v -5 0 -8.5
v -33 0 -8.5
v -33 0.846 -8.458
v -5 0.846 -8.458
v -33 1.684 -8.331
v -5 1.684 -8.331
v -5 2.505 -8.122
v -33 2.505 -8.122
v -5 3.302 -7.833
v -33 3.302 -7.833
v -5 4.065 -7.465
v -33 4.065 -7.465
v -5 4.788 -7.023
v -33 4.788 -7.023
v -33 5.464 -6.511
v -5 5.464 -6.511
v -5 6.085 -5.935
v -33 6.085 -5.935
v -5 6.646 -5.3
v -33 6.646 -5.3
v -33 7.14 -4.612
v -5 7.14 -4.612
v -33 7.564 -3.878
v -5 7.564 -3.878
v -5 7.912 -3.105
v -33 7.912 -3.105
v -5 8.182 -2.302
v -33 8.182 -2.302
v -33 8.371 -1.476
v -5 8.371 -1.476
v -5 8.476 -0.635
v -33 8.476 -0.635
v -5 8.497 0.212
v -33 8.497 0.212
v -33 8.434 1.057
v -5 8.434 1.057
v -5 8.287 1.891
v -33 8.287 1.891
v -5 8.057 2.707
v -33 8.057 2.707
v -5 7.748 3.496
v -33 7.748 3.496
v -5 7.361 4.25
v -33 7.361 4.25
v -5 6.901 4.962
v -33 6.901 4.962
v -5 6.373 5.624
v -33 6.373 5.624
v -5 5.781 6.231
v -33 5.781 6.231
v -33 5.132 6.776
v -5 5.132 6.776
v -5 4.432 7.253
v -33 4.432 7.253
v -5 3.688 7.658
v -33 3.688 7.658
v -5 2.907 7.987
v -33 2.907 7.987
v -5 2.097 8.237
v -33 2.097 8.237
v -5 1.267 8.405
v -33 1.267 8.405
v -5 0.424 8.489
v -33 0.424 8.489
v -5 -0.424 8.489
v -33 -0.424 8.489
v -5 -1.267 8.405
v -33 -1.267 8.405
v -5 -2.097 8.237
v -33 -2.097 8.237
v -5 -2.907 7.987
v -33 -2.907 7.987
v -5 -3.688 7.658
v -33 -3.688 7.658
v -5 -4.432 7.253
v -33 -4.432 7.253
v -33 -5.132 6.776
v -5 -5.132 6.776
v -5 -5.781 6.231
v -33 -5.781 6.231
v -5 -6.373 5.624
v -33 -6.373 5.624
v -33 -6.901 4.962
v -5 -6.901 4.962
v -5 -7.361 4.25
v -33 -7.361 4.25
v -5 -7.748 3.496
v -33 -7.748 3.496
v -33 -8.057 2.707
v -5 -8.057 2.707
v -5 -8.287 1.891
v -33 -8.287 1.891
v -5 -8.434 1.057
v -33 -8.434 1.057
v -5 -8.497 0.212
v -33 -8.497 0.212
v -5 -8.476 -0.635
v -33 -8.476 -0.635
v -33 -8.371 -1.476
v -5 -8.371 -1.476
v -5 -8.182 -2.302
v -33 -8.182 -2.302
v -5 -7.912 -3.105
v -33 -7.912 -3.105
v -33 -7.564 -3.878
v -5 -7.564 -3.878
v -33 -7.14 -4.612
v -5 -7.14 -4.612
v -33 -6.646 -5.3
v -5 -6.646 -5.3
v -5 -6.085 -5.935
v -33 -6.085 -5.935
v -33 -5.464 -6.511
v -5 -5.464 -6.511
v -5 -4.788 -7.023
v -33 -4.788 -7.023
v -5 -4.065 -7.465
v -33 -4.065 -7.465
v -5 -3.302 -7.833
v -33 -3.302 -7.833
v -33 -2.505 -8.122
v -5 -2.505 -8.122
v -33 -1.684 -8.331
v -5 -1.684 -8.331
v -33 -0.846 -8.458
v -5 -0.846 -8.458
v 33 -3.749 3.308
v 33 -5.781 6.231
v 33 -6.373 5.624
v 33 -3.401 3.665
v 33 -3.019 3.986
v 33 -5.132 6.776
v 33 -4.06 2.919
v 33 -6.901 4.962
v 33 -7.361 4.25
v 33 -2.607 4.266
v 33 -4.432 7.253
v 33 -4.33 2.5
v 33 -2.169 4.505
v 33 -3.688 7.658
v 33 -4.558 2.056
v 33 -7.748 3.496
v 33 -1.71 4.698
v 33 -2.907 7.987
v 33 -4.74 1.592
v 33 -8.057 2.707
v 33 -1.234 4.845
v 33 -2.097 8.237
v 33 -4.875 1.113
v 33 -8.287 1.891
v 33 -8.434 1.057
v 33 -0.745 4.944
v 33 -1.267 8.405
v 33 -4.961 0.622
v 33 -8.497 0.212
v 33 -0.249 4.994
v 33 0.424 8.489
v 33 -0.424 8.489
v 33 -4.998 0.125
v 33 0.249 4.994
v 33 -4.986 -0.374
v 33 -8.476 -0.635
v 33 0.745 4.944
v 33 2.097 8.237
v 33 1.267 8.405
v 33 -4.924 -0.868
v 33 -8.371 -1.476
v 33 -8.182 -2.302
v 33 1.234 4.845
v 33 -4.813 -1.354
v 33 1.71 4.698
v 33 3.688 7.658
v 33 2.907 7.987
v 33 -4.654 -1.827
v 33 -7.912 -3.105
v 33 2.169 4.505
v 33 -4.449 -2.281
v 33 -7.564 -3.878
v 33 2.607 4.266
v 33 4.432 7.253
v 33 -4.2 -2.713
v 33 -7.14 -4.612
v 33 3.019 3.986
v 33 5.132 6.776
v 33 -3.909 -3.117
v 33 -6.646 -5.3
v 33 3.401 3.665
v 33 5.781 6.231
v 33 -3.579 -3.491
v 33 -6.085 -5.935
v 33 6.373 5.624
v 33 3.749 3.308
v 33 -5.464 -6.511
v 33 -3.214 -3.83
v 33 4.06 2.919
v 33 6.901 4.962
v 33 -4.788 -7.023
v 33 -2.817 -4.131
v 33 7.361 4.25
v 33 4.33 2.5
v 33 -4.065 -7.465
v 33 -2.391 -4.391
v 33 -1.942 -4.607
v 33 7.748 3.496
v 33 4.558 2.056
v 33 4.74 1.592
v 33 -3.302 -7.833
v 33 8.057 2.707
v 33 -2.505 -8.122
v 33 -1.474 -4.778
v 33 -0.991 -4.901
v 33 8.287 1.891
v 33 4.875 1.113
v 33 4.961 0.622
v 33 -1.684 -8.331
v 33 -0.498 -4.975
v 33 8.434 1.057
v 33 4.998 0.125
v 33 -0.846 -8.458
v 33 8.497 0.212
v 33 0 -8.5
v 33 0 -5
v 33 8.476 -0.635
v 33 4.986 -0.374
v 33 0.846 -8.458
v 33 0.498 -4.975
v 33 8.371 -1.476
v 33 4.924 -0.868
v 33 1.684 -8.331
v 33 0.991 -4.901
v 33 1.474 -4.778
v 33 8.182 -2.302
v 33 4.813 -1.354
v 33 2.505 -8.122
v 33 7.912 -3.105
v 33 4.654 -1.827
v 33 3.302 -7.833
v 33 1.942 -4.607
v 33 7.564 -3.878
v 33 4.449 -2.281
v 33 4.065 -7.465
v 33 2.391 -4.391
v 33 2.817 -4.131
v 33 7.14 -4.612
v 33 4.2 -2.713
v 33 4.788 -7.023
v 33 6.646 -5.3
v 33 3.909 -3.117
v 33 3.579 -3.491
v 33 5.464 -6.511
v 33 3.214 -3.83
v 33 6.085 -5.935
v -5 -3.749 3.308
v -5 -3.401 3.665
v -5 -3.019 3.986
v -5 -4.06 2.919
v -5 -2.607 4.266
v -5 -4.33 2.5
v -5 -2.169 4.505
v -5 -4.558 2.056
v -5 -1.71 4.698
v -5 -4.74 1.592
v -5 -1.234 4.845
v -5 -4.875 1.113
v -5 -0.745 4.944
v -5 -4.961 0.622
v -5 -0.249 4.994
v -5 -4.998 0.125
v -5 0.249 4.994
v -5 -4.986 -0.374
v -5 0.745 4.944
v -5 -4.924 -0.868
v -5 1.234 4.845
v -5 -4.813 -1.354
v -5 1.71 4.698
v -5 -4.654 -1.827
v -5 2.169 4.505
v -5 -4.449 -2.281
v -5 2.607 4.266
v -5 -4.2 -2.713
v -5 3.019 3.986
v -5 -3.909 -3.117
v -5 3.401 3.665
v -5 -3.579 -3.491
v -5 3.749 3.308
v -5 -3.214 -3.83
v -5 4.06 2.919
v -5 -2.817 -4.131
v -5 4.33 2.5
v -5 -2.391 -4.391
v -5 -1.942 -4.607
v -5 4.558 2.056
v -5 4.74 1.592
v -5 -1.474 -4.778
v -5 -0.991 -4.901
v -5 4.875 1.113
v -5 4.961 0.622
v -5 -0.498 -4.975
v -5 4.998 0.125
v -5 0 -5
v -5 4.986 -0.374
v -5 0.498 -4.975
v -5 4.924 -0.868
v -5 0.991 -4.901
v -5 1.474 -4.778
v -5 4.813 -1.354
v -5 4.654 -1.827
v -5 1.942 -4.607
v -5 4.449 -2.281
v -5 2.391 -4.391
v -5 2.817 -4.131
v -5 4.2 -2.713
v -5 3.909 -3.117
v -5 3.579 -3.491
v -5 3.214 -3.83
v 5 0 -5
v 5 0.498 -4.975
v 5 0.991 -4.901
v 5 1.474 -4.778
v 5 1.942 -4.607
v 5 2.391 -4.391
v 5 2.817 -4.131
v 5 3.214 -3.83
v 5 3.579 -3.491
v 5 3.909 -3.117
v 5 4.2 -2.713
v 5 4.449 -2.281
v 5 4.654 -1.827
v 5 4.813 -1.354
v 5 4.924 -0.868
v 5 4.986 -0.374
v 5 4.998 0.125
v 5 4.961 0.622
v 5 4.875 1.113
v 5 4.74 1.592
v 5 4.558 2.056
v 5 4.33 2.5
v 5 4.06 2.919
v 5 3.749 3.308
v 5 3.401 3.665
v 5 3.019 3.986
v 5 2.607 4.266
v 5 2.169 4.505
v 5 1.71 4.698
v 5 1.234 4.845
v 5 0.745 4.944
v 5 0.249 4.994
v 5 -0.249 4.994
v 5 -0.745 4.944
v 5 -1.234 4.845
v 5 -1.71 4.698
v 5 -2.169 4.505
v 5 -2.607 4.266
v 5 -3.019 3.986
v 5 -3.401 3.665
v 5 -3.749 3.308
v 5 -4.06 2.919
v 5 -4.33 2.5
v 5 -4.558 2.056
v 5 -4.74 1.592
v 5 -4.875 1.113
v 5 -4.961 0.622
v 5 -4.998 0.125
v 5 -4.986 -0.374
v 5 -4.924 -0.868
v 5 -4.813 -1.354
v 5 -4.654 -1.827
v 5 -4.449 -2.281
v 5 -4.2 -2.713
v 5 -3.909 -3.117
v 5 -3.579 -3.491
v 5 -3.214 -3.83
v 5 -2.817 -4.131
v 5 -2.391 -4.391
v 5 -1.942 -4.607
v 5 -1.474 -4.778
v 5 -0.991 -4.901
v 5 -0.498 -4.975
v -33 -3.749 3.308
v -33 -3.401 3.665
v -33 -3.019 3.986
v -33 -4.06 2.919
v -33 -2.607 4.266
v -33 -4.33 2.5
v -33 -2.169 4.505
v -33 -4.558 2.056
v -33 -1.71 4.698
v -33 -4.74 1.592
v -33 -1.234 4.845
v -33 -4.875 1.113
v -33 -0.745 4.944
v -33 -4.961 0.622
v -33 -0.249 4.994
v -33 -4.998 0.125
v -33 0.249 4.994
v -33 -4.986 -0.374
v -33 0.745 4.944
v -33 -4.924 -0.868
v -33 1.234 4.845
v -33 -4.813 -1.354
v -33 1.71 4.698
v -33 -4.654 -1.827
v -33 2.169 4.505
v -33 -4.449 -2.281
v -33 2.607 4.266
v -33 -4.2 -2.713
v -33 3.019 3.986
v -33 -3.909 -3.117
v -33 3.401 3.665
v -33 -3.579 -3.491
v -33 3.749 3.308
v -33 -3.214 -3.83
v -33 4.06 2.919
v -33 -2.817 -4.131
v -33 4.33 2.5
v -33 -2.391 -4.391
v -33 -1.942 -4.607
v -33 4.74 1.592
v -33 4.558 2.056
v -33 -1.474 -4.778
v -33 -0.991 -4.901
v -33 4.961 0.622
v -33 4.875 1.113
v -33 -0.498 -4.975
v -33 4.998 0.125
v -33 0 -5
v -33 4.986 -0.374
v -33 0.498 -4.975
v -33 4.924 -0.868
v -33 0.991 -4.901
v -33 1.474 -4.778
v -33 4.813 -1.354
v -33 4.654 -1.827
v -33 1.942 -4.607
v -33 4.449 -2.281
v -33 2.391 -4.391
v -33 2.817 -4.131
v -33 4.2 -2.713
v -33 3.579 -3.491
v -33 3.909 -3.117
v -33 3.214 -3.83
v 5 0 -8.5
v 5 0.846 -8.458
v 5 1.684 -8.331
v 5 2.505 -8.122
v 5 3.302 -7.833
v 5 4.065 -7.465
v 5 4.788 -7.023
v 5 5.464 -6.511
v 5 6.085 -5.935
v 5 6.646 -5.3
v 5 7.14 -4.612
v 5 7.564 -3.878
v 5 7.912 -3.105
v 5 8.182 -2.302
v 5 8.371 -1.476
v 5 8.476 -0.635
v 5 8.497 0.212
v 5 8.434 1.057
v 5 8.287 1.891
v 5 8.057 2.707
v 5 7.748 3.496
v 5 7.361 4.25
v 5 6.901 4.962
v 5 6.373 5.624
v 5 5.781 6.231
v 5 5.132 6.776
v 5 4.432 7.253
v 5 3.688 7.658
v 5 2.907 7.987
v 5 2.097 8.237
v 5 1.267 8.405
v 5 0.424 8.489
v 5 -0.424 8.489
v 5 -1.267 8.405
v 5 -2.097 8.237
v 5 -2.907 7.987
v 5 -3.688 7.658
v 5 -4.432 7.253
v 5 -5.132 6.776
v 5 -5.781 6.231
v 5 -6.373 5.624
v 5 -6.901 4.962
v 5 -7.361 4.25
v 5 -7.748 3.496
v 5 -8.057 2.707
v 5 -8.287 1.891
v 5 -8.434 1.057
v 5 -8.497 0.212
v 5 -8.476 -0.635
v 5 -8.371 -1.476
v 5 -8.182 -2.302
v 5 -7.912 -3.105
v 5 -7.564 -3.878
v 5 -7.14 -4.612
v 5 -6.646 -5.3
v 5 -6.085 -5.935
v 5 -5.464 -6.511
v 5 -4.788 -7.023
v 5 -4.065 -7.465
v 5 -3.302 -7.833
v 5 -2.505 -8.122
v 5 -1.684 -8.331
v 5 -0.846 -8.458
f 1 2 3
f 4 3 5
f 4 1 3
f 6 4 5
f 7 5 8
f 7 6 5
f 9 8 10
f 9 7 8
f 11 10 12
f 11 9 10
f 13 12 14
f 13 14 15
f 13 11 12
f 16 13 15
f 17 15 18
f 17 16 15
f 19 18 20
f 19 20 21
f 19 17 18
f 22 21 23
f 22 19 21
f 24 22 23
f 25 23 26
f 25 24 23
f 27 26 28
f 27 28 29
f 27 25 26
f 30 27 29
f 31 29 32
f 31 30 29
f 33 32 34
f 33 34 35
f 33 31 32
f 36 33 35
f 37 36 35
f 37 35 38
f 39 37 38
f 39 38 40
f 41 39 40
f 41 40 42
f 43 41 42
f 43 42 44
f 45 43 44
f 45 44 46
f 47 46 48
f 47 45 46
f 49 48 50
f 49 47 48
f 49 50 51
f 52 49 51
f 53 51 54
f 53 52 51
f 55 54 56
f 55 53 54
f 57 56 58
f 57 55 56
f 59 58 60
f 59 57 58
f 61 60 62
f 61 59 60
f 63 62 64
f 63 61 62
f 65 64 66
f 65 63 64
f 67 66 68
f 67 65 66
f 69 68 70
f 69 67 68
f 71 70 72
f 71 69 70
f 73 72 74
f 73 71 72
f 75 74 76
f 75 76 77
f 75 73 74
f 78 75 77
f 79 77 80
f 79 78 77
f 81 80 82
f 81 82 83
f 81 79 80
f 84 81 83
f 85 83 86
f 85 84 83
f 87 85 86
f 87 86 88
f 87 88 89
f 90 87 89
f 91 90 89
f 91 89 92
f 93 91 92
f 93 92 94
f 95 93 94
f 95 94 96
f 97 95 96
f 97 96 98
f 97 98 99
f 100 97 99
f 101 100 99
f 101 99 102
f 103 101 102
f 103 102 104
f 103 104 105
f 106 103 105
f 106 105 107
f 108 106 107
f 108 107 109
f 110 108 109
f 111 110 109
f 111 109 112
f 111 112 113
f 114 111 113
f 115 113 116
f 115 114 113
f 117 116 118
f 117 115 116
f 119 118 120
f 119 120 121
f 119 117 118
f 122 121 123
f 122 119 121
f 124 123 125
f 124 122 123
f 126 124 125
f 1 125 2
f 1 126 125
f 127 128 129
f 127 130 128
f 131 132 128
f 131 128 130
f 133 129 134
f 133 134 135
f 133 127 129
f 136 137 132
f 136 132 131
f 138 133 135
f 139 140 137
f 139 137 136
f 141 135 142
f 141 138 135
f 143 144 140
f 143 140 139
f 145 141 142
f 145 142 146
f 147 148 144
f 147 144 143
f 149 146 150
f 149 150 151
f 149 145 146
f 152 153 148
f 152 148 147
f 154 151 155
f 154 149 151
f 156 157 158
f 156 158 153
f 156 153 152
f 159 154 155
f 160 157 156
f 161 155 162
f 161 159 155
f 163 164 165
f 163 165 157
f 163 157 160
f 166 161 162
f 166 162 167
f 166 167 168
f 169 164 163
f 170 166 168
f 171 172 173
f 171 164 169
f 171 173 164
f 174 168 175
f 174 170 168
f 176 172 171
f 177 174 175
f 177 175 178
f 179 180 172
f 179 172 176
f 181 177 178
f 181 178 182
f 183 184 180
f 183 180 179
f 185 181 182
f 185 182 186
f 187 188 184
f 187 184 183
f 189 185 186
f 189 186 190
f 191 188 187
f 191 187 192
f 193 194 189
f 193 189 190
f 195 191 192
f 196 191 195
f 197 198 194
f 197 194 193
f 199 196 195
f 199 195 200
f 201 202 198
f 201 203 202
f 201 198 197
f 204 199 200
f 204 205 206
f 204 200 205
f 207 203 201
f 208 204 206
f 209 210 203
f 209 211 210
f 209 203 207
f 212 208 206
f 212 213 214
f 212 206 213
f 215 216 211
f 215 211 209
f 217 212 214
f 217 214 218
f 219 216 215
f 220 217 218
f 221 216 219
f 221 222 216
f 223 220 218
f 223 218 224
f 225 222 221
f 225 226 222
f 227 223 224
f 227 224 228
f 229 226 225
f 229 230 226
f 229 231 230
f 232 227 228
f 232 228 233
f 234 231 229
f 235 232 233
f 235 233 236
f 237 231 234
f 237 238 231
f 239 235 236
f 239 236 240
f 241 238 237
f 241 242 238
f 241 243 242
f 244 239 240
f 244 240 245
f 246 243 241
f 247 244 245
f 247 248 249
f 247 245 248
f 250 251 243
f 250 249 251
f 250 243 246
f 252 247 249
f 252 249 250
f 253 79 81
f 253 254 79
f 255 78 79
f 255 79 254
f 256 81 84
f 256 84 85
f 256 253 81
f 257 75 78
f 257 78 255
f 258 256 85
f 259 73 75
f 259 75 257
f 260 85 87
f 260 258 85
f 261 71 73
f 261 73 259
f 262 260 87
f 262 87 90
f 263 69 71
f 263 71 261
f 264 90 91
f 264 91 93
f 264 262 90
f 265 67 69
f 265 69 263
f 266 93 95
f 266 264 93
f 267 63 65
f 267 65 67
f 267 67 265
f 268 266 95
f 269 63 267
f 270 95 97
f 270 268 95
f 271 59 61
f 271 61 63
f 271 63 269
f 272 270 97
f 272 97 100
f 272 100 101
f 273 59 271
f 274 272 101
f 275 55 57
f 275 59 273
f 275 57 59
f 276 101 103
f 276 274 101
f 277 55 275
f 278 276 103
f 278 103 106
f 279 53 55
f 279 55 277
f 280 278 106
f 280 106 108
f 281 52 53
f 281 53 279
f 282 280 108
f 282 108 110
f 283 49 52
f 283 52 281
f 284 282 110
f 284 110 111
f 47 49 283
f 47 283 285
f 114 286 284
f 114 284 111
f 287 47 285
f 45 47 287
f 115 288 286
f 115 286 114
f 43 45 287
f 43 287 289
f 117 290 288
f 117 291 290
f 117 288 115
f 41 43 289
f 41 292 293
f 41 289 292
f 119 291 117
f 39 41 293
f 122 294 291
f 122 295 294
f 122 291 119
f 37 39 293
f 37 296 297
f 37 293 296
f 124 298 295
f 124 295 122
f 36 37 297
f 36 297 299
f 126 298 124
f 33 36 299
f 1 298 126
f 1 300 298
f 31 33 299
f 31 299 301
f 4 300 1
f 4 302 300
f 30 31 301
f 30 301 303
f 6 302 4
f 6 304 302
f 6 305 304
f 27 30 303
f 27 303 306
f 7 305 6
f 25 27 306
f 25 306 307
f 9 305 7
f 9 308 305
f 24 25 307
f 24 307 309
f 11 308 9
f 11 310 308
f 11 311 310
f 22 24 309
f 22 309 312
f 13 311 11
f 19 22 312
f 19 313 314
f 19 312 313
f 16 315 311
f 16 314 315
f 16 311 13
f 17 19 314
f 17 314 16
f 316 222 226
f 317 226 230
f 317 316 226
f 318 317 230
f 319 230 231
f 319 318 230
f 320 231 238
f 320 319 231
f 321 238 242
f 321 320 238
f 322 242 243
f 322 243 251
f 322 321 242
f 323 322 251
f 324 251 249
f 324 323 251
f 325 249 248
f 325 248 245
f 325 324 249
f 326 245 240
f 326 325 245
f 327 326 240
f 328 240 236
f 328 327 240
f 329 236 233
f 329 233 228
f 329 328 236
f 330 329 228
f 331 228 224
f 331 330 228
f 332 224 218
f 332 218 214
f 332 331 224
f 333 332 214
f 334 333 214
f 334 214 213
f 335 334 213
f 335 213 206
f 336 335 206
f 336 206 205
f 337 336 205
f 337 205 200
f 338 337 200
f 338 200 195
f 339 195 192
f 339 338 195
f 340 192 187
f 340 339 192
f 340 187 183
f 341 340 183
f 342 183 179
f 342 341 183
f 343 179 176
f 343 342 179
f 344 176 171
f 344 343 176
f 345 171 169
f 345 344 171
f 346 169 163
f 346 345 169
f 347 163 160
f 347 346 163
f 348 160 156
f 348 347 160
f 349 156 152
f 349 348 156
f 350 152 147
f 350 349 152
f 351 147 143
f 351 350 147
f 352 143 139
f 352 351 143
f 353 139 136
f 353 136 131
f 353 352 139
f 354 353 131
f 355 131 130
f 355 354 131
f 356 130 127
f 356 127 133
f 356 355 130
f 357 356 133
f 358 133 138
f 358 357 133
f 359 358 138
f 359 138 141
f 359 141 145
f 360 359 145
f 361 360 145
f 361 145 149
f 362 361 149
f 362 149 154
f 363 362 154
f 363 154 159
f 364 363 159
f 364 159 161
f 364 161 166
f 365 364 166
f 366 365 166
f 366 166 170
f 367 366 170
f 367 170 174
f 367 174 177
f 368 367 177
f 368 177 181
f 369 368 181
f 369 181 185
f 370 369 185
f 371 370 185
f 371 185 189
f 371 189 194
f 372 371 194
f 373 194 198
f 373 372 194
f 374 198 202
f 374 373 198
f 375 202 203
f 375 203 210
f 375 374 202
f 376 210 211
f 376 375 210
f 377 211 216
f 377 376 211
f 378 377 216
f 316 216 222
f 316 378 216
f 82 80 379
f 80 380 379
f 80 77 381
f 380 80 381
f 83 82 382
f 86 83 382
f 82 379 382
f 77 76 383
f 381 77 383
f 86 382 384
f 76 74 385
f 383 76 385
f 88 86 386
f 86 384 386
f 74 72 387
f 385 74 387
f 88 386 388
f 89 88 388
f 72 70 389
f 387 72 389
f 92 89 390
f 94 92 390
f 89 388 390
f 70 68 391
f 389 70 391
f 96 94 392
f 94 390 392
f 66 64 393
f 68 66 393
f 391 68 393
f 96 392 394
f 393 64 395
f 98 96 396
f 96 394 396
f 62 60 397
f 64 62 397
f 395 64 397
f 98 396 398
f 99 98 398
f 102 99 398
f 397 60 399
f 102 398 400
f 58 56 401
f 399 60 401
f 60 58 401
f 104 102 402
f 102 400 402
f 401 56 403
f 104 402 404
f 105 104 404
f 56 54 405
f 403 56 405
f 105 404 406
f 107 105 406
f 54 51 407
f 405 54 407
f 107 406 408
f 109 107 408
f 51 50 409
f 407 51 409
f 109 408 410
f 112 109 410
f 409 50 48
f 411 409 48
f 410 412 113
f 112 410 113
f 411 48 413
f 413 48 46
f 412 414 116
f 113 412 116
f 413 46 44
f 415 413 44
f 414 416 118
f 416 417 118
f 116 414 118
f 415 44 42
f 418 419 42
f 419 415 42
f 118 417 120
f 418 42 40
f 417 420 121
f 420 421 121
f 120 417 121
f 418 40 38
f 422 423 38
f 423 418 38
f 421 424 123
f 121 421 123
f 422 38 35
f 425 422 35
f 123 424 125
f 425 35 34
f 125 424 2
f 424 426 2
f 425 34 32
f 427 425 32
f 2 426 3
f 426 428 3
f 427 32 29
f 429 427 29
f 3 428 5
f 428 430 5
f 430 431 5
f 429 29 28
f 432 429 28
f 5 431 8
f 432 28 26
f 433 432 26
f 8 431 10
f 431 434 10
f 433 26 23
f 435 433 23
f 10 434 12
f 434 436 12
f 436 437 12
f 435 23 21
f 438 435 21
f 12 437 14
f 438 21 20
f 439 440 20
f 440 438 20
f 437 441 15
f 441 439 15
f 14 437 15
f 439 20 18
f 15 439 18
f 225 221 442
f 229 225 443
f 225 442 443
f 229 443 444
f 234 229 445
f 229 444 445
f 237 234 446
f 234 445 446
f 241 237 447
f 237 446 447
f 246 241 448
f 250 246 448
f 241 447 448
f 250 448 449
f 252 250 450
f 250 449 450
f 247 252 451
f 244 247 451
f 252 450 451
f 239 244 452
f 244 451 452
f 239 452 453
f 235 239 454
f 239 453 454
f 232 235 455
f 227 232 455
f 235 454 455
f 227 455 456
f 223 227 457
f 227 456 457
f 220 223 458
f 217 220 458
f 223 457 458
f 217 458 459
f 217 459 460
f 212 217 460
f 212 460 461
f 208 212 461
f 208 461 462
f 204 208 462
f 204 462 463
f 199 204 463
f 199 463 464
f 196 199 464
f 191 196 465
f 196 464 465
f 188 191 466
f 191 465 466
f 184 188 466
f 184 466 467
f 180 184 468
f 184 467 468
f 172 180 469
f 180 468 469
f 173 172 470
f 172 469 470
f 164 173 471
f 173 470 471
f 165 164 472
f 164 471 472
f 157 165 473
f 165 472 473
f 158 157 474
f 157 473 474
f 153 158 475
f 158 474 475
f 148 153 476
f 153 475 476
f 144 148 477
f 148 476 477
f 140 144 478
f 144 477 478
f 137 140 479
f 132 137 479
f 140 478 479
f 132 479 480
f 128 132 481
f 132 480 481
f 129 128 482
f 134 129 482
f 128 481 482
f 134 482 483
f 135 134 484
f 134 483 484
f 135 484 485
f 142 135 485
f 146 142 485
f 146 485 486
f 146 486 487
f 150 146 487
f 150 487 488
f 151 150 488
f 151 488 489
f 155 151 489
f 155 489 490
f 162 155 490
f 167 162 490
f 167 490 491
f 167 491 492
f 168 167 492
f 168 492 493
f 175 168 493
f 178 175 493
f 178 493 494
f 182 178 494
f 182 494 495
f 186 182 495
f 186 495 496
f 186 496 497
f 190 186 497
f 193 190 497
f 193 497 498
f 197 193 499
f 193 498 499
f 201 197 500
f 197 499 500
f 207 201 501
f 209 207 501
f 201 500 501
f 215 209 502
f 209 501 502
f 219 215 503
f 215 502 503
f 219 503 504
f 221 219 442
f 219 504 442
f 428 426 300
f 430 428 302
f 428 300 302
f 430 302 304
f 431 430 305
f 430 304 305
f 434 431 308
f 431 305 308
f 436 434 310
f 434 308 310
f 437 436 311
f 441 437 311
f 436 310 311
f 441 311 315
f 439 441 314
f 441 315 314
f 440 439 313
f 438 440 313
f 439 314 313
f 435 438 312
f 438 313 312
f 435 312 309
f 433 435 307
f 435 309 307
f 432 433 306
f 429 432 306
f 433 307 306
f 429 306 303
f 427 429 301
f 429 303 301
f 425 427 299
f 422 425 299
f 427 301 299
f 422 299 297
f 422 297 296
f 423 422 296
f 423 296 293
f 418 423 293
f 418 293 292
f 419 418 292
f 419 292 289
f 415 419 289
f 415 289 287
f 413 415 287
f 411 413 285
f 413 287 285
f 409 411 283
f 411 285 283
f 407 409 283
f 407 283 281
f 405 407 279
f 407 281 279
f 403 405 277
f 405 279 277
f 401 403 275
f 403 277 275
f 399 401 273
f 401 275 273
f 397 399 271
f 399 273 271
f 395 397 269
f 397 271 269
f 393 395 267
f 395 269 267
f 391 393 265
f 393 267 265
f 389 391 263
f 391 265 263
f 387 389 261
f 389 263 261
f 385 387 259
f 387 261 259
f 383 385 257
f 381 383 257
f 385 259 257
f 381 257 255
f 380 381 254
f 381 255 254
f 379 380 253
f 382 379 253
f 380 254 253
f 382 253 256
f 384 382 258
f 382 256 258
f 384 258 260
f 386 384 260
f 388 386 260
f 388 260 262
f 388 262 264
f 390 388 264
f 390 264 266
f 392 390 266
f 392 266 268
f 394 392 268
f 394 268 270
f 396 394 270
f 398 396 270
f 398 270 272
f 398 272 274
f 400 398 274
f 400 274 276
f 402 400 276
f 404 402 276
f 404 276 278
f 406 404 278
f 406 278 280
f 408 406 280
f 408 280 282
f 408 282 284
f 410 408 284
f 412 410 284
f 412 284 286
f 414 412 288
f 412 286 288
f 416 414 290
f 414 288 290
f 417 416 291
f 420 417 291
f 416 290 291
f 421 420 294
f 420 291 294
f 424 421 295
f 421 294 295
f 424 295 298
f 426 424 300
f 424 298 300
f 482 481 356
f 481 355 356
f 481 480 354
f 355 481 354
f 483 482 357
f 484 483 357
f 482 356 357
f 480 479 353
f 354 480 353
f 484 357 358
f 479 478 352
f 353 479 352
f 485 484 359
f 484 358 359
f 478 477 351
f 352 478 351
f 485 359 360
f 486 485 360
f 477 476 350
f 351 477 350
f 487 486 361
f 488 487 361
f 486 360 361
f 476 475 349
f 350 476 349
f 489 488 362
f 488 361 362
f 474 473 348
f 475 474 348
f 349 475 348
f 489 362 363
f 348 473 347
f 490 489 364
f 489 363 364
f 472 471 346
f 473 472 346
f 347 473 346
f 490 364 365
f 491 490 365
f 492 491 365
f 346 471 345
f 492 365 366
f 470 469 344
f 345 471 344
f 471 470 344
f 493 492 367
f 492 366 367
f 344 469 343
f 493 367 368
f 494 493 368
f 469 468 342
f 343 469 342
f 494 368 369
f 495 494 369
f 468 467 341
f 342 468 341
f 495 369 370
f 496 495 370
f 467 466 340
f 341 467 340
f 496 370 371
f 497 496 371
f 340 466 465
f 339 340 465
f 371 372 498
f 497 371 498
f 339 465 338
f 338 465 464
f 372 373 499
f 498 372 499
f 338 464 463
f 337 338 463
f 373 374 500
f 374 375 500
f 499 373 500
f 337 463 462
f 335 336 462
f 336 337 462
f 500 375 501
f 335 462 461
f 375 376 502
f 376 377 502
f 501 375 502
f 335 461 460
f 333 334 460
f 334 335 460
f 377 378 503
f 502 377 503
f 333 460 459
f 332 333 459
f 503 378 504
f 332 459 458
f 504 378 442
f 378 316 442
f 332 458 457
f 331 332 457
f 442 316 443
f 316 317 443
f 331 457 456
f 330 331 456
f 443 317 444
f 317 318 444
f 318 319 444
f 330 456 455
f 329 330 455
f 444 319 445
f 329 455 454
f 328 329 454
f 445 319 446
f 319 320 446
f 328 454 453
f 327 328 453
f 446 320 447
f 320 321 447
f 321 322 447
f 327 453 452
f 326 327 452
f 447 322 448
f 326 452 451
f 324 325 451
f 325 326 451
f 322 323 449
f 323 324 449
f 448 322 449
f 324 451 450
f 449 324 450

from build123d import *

# Parameters (mm, degrees)
BOSS_EXTRUDE1_START = 5
SKETCH1_R           = 8.5
SKETCH1_R_2         = 5
BOSS_EXTRUDE1_DEPTH = 28


with BuildPart() as part:
    # Sketch1 → Boss-Extrude1 (new body)
    with BuildSketch(Plane(origin=(0, 0, 0), x_dir=(0, 0, -1), z_dir=(1, 0, 0)).offset(BOSS_EXTRUDE1_START)):
        Circle(SKETCH1_R)
        Circle(SKETCH1_R_2, mode=Mode.SUBTRACT)
    extrude(amount=BOSS_EXTRUDE1_DEPTH)


with BuildPart() as body_2:
    # Mirror2: mirrored copy
    add(part.part.mirror(Plane(origin=(0, 0, 0), x_dir=(0, 0, 1), z_dir=(1, 0, 0))))


solid = Compound([part.part, body_2.part])
